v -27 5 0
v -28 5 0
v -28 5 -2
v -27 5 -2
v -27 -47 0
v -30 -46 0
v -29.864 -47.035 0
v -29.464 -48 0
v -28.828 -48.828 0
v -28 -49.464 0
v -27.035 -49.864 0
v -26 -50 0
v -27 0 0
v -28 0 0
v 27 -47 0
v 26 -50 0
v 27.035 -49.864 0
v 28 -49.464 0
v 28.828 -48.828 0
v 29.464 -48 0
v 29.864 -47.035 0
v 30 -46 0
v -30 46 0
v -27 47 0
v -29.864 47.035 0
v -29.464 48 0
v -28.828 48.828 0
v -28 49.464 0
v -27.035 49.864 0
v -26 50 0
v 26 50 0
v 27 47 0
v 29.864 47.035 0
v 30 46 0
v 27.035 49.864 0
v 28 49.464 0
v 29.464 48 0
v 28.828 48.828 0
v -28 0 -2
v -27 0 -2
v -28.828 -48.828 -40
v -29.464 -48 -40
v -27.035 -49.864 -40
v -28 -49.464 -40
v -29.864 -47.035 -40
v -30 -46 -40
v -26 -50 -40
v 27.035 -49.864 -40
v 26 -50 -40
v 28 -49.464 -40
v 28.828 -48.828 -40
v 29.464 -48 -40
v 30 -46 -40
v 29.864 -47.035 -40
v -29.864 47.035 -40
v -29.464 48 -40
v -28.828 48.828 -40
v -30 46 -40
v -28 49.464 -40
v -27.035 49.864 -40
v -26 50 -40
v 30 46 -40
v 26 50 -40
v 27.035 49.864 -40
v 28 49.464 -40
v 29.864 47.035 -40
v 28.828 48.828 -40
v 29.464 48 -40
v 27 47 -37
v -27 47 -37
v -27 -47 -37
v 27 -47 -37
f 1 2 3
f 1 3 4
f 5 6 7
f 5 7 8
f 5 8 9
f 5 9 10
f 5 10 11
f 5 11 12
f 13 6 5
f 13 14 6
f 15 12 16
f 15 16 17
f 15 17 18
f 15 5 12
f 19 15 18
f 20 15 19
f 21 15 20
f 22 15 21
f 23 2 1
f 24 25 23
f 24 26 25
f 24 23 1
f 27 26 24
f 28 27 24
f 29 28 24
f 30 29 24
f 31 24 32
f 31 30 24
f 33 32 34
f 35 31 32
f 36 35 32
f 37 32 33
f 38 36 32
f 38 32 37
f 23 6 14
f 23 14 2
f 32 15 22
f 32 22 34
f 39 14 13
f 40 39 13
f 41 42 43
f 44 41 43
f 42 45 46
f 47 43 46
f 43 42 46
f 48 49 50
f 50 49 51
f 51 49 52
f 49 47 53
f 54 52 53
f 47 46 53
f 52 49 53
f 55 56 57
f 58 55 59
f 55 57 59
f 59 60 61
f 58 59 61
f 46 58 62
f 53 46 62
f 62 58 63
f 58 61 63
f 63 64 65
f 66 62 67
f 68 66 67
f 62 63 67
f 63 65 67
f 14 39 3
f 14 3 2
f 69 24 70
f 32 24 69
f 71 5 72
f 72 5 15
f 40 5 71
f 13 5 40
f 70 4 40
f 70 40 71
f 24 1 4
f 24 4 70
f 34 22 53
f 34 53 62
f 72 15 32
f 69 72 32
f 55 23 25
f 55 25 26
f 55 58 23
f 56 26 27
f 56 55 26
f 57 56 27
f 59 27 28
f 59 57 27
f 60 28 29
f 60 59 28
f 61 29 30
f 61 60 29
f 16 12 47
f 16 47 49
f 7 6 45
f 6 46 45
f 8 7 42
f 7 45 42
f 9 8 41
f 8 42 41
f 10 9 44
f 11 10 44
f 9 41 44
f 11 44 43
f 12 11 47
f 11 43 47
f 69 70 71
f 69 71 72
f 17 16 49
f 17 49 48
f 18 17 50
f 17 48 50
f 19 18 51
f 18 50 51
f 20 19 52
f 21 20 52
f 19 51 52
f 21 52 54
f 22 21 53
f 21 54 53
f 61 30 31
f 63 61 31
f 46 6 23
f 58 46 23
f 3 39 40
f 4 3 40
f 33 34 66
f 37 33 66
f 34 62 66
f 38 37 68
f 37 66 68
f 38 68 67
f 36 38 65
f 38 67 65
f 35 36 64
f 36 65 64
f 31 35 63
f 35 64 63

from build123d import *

# Parameters (mm, degrees)
SKETCH_W     = 60
SKETCH_H     = 100
PAD_DEPTH    = 40
THICKNESS_T  = -3
FILLET_R     = 4
SKETCH002_W  = 1
SKETCH002_H  = 2
POCKET_DEPTH = 5


with BuildPart() as part:
    # Sketch → Pad (new body)
    with BuildSketch(Plane.XY):
        Rectangle(SKETCH_W, SKETCH_H)
    extrude(amount=-PAD_DEPTH)

    # Thickness
    thickness_openings = [part.faces().sort_by_distance(p)[0] for p in [
        (0, 0, 0),
    ]]
    offset(amount=THICKNESS_T, openings=thickness_openings, kind=Kind.INTERSECTION)

    # Fillet
    fillet_edges = [part.edges().sort_by_distance(p)[0] for p in [
        (30, -50, -20),
        (-30, -50, -20),
        (30, 50, -20),
        (-30, 50, -20),
    ]]
    fillet(fillet_edges, radius=FILLET_R)

    # Sketch002 → Pocket (cut)
    with BuildSketch(Plane.XZ):
        with Locations((-27.5, -1)):
            Rectangle(SKETCH002_W, SKETCH002_H)
    extrude(amount=-POCKET_DEPTH, mode=Mode.SUBTRACT)


solid = part.part
